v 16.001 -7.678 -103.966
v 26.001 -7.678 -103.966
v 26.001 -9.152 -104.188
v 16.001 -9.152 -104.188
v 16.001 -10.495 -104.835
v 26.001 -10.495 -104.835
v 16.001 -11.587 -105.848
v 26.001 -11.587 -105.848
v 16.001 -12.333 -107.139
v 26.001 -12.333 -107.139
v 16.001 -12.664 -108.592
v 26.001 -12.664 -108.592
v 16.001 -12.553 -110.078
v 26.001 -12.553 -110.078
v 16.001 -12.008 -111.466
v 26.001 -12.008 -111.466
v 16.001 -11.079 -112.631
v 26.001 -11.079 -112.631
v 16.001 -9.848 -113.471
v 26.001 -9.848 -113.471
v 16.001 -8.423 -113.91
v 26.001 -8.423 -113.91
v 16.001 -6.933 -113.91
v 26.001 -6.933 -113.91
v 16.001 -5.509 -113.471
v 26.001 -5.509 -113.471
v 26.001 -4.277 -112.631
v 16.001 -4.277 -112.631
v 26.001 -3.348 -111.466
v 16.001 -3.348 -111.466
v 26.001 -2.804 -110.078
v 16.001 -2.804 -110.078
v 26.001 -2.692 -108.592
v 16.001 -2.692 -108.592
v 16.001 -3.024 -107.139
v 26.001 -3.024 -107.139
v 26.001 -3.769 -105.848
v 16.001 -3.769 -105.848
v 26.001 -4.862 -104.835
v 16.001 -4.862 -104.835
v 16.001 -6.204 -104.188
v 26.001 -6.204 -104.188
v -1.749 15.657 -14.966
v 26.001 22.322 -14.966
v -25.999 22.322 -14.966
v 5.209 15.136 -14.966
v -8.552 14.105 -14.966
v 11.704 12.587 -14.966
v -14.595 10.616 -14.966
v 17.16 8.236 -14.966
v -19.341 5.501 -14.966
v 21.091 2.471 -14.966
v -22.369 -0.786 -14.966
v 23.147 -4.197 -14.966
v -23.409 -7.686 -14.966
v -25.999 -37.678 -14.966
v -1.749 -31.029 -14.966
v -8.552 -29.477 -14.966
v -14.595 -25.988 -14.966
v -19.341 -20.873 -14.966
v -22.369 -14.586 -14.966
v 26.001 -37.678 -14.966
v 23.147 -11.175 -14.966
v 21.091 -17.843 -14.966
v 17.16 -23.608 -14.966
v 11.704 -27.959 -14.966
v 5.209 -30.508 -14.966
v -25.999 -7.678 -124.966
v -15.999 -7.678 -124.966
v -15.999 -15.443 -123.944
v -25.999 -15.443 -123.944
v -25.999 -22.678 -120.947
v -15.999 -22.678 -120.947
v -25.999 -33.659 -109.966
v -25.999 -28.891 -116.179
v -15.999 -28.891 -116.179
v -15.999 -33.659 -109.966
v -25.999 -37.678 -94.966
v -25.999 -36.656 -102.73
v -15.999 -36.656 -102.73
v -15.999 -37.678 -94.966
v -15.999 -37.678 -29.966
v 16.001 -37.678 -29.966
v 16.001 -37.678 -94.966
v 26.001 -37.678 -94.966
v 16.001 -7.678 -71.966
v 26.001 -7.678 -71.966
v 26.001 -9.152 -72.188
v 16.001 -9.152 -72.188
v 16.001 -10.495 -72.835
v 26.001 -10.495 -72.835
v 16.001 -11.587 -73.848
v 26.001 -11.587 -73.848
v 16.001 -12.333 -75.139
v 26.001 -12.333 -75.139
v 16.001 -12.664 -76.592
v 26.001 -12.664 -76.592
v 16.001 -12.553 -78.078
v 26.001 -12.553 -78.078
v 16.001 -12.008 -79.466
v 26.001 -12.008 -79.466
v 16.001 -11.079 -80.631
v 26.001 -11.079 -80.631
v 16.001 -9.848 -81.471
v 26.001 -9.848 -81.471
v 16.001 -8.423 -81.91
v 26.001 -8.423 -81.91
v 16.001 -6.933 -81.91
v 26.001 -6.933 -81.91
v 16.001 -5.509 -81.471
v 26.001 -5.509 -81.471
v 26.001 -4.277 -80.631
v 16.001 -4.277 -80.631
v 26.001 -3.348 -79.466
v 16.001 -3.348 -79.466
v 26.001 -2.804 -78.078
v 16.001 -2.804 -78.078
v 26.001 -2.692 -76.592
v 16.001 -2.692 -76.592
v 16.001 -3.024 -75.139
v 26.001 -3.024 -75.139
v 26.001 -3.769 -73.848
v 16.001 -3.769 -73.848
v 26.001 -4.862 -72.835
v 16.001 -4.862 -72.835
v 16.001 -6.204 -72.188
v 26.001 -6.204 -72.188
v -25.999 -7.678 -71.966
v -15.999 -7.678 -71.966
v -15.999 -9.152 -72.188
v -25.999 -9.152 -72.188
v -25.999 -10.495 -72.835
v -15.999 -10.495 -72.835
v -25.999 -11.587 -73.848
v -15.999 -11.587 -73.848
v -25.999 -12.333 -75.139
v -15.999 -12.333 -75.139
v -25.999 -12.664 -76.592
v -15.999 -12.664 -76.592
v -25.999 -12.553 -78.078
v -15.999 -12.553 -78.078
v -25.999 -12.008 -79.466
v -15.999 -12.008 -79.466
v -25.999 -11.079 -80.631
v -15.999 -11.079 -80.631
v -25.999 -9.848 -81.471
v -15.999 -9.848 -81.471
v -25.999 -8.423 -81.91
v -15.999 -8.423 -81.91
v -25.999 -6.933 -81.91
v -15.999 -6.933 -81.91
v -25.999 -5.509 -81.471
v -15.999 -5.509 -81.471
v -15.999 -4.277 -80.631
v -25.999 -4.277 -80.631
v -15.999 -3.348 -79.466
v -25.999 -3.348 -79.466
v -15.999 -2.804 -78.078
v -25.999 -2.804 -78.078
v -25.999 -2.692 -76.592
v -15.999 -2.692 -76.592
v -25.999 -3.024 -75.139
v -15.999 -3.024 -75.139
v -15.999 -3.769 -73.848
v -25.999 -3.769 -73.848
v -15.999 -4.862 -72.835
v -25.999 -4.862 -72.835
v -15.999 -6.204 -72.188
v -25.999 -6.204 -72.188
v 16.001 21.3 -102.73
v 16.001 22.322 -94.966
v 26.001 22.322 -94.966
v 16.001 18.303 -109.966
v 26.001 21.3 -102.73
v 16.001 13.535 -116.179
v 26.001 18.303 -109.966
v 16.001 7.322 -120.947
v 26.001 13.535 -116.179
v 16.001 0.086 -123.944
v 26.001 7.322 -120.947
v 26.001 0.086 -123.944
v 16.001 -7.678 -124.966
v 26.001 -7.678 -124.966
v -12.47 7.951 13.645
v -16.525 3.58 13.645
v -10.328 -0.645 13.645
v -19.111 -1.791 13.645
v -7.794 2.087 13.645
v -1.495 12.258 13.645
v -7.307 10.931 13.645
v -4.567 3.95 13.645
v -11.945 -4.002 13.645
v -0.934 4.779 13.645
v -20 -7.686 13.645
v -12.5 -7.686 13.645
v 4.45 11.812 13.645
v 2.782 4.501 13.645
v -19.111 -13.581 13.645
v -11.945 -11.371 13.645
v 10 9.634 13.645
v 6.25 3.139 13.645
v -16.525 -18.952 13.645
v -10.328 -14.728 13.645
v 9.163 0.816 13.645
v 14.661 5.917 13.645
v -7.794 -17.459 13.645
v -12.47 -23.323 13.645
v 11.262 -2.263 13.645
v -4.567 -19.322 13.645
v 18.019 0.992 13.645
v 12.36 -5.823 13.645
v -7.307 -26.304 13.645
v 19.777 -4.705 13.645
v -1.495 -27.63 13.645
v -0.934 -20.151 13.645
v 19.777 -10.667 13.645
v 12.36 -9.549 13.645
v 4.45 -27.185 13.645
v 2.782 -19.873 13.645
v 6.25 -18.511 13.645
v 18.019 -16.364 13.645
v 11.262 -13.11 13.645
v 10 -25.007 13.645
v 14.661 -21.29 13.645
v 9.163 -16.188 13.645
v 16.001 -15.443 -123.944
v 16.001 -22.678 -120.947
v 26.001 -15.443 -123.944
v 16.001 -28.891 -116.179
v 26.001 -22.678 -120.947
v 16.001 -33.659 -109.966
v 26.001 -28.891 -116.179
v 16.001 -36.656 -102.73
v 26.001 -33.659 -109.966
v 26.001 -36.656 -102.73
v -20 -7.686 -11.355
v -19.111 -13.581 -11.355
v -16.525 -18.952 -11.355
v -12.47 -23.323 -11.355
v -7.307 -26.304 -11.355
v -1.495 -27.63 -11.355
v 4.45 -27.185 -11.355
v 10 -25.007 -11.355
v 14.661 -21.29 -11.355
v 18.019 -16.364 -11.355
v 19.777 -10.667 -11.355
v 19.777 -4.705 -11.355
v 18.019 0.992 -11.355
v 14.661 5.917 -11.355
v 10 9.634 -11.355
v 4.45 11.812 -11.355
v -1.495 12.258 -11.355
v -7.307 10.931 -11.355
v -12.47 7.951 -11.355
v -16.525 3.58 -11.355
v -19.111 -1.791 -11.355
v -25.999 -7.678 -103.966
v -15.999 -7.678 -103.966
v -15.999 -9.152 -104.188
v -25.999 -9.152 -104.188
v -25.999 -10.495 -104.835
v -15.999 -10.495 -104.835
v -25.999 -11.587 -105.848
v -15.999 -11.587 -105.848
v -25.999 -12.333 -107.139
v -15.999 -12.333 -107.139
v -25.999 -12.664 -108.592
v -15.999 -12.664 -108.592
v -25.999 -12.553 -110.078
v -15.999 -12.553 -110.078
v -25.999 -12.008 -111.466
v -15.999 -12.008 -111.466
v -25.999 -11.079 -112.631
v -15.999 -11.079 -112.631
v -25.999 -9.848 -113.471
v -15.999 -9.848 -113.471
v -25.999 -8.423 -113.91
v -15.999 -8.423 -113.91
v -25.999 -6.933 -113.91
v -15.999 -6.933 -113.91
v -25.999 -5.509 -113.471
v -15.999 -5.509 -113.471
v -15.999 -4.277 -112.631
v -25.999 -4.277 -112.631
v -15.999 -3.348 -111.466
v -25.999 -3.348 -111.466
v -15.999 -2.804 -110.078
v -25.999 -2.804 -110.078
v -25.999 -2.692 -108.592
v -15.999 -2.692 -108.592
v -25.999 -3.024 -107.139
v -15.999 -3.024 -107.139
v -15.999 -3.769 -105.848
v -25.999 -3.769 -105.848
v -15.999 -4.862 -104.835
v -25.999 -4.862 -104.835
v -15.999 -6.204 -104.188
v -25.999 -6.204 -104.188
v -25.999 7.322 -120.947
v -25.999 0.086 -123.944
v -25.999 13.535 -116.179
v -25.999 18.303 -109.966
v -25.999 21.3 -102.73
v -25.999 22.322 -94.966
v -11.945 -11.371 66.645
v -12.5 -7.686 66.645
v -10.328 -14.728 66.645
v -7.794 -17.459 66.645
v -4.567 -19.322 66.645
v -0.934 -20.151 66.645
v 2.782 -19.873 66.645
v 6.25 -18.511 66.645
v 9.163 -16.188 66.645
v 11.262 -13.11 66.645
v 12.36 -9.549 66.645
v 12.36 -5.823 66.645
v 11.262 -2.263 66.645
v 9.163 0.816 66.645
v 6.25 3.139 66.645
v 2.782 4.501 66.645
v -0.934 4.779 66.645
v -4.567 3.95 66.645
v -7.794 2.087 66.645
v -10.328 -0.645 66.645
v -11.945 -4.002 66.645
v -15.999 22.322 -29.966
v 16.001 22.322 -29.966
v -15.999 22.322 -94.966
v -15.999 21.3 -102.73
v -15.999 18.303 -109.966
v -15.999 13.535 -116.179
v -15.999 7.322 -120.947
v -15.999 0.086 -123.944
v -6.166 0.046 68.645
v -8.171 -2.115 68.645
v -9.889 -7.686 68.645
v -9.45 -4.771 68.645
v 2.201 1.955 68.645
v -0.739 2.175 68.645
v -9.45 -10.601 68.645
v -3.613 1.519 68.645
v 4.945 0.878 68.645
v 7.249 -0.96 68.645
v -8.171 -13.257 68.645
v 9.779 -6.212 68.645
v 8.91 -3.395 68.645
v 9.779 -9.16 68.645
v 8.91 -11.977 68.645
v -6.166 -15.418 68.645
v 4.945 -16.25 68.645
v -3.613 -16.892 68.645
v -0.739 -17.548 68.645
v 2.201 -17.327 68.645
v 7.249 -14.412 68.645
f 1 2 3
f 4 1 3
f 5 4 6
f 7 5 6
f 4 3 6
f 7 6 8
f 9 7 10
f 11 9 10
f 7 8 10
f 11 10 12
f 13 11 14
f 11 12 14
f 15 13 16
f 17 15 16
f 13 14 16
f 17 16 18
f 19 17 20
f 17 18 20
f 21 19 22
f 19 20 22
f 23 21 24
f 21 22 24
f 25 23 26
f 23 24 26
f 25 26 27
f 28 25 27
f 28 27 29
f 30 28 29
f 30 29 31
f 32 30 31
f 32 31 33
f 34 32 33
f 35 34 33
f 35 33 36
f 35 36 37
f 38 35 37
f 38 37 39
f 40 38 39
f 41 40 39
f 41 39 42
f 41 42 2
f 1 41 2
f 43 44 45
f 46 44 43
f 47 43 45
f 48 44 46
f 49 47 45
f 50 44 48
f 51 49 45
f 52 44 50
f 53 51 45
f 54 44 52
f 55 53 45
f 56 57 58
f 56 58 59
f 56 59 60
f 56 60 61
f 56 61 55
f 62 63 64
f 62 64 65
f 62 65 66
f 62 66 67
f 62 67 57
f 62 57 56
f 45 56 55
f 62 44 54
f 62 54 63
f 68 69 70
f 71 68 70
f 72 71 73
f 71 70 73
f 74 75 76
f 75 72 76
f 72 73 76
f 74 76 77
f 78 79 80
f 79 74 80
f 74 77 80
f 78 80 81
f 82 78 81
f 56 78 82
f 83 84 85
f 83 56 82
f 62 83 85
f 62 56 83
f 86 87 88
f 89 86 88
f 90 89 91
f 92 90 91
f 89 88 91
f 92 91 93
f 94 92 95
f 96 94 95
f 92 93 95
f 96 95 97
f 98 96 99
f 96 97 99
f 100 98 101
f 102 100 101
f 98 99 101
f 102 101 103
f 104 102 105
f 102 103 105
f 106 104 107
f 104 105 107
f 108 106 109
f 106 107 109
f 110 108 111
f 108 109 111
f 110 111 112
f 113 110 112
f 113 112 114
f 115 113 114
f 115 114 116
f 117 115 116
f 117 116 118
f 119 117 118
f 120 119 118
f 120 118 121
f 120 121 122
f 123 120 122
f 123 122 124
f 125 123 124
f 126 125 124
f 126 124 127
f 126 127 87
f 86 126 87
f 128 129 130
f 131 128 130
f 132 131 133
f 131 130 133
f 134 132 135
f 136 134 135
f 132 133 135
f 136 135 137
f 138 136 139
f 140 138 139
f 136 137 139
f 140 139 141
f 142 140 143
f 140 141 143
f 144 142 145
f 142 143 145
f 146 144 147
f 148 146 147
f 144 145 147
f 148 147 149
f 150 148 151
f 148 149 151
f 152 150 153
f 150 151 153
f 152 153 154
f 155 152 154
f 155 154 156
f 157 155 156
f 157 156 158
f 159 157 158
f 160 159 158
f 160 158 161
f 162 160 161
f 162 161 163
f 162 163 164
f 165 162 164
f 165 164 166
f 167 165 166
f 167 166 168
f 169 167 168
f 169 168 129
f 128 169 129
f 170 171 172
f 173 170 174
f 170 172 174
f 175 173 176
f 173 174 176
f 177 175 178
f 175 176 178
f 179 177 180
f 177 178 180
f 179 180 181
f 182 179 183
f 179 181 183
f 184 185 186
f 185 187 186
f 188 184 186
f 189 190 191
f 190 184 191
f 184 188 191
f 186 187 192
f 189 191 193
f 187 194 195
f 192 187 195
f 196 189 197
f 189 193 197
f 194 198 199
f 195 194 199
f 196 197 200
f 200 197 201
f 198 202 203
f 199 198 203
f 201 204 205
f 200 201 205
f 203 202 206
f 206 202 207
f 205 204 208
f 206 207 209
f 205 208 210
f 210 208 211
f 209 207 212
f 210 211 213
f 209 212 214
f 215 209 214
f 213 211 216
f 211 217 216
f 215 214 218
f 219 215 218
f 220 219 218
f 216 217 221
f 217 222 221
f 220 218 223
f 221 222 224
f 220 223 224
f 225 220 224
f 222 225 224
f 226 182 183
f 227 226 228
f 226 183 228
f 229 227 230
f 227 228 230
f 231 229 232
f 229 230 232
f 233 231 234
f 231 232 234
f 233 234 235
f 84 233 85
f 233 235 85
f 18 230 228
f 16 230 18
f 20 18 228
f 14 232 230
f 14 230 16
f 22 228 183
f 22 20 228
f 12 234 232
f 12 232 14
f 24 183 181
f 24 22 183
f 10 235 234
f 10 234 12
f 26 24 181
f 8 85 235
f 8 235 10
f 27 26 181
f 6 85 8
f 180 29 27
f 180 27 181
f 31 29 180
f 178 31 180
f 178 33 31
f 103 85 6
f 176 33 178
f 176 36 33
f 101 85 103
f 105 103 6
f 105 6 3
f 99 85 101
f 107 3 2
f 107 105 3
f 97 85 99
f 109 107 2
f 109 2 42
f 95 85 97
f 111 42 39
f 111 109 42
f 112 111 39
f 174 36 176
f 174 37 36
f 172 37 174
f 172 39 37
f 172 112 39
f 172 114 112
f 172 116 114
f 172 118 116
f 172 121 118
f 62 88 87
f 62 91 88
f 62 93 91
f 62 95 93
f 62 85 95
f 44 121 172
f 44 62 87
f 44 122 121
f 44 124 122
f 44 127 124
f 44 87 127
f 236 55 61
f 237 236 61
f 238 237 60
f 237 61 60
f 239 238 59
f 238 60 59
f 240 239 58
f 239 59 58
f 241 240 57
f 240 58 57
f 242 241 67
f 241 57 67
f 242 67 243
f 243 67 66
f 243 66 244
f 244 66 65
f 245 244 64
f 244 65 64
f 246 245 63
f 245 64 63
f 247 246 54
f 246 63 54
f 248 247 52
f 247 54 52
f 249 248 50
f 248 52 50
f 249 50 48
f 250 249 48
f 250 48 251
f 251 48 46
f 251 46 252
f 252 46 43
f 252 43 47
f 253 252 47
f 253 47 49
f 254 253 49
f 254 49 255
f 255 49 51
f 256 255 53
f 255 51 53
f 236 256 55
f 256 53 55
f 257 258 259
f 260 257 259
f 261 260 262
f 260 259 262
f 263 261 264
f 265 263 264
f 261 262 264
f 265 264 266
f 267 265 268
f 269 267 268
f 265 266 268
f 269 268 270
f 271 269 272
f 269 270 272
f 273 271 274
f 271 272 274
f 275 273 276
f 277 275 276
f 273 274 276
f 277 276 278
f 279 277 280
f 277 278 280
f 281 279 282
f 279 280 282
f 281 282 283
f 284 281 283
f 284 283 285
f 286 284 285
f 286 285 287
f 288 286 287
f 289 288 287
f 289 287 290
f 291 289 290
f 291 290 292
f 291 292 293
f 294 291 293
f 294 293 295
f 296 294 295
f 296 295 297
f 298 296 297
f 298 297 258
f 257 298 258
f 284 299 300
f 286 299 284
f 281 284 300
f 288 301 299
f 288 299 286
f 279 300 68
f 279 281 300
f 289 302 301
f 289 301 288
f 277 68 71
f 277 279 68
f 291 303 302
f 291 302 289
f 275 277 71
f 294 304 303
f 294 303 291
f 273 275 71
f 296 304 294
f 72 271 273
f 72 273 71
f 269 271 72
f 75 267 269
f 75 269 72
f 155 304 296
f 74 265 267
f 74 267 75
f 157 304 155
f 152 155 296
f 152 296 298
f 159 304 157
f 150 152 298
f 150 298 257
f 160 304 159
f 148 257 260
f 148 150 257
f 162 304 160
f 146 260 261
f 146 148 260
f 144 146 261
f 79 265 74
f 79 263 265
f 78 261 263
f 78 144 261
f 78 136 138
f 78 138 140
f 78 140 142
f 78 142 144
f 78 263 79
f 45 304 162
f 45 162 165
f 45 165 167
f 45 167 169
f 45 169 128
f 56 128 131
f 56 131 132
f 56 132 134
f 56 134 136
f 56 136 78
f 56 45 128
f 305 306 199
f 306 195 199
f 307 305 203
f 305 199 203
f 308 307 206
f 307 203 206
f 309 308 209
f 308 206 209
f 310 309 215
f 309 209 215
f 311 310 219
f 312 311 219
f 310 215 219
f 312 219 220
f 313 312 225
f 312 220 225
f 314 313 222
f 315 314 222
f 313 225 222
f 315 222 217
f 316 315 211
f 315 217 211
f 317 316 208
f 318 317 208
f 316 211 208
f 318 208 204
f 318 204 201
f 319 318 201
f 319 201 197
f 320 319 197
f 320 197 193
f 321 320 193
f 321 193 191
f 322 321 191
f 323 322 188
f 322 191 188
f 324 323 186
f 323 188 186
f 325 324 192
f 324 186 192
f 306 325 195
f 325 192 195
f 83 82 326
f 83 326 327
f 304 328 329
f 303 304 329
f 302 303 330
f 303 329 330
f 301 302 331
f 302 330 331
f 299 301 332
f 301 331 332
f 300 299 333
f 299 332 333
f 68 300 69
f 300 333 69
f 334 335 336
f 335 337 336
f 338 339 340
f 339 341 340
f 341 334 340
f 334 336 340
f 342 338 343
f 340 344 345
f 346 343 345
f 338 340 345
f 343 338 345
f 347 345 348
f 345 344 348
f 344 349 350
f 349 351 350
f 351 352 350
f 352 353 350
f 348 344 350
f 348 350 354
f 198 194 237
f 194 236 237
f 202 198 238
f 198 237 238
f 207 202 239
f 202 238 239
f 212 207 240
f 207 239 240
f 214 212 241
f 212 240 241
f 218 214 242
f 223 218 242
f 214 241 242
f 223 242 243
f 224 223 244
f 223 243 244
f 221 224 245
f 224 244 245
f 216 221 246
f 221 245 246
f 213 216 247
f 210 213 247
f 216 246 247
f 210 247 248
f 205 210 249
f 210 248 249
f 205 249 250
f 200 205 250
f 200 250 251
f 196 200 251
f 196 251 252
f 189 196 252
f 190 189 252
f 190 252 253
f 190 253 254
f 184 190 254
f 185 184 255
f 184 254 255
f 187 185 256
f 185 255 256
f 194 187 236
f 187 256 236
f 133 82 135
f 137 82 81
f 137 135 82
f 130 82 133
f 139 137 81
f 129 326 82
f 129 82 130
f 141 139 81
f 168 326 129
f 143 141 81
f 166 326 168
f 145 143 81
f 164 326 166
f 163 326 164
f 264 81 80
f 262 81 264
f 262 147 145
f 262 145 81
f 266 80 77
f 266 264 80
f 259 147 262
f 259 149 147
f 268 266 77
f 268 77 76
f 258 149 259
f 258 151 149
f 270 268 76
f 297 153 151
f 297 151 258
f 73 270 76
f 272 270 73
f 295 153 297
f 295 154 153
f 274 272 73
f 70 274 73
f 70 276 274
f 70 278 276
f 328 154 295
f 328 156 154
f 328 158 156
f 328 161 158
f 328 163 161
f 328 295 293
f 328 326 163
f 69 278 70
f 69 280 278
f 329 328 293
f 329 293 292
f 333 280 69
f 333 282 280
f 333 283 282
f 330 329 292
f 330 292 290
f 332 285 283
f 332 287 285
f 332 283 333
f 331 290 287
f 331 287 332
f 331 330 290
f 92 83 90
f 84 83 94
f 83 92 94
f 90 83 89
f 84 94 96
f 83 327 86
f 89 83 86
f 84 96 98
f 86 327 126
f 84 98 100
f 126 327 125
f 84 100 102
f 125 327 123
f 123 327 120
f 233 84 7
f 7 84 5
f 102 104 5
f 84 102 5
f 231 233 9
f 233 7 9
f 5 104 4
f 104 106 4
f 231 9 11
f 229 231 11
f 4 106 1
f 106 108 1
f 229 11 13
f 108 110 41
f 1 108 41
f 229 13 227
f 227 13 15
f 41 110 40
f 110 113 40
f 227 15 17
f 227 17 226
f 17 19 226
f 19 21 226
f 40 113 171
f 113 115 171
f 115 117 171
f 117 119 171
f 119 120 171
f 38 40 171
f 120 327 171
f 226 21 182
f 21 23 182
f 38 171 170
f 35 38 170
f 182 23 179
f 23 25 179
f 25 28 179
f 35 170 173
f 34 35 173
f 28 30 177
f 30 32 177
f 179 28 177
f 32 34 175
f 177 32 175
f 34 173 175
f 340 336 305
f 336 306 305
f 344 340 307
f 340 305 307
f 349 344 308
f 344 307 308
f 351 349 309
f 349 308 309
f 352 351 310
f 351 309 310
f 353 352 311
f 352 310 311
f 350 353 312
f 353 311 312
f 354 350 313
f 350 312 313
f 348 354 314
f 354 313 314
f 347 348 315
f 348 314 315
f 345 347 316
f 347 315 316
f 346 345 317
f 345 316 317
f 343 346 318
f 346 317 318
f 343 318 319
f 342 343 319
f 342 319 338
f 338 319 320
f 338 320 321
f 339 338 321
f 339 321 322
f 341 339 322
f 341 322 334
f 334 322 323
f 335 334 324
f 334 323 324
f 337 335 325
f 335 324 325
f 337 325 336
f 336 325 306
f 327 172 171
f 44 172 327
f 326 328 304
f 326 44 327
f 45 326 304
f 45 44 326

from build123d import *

# Parameters (mm, degrees)
BOSS_EXTRUDE1_DEPTH      = 5
BOSS_EXTRUDE1_DEPTH_BACK = 105
SKETCH5_W                = 32
SKETCH5_H                = 95
CUT_EXTRUDE1_DEPTH       = 100
CUT_EXTRUDE2_DEPTH       = 40
CUT_EXTRUDE2_DEPTH_BACK  = 113
SKETCH7_R                = 5
CUT_EXTRUDE4_DEPTH       = 234
CUT_EXTRUDE4_DEPTH_BACK  = 234


with BuildPart() as part:
    # Sketch2 → Revolve2 (revolve)
    with BuildSketch(Plane(origin=(0, 0, 0), x_dir=(0, 0, -1), z_dir=(1, 0, 0))):
        Polygon((15.054954353, -7.686097714), (-68.645045647, -7.686097714), (-68.645045647, 2.203003026), (-66.645045647, 4.813902286), (-13.645045647, 4.813902286), (-13.645045647, 12.313902286), (11.354954353, 12.313902286), (15.054954353, 15.806805515), align=None)
    revolve(axis=Axis((0, -7.686097714, -15.054954353), (0, 0, 1)))

    # 3DSketch2 → Boss-Extrude1 (add, two sides: drawn at the far end of the back side and taken through both)
    with BuildSketch(Plane(origin=(26.001222768, 22.321847461, -19.965853613), x_dir=(-0.6549305384178419, -0.7556890827898176, 0), z_dir=(0, 0, 1)).offset(-BOSS_EXTRUDE1_DEPTH_BACK)):
        Polygon((0, 0), (34.056387998, -39.295832305), (79.397732965, 0), (45.341344967, 39.295832305), align=None)
    extrude(amount=BOSS_EXTRUDE1_DEPTH + BOSS_EXTRUDE1_DEPTH_BACK)

    # Sketch5 → Cut-Extrude1 (cut)
    with BuildSketch(Plane(origin=(0, 22.321847461, 0), x_dir=(1, 0, 0), z_dir=(0, 1, 0))):
        with Locations((0.001222768, 77.465853613)):
            Rectangle(SKETCH5_W, SKETCH5_H)
    extrude(amount=-CUT_EXTRUDE1_DEPTH, mode=Mode.SUBTRACT)

    # Sketch7 → Cut-Extrude2 (cut, two sides: drawn at the far end of the back side and taken through both)
    with BuildSketch(Plane(origin=(26.001222768, 0, 0), x_dir=(0, 0, -1), z_dir=(1, 0, 0)).offset(-CUT_EXTRUDE2_DEPTH_BACK)):
        with Locations((76.965853613, -7.678152539)):
            Circle(SKETCH7_R)
        with Locations((108.965853613, -7.678152539)):
            Circle(SKETCH7_R)
    extrude(amount=CUT_EXTRUDE2_DEPTH + CUT_EXTRUDE2_DEPTH_BACK, mode=Mode.SUBTRACT)

    # Sketch8 → Cut-Extrude4 (cut, two sides: drawn at the far end of the back side and taken through both)
    with BuildSketch(Plane(origin=(26.001222768, 0, 0), x_dir=(0, 0, -1), z_dir=(1, 0, 0)).offset(-CUT_EXTRUDE4_DEPTH_BACK)):
        with BuildLine():
            Line((124.965853613, -37.678152539), (124.965853613, -7.678152493))
            ThreePointArc((124.965853613, -7.678152493), (116.179057065, -28.891355958), (94.965853613, -37.678152539))
            Line((94.965853613, -37.678152539), (124.965853613, -37.678152539))
        make_face()
        with BuildLine():
            Line((124.965853613, -7.678152493), (124.965853613, 22.321847461))
            Line((124.965853613, 22.321847461), (94.965853613, 22.321847461))
            ThreePointArc((94.965853613, 22.321847461), (116.179057032, 13.535050913), (124.965853613, -7.678152493))
        make_face()
    extrude(amount=CUT_EXTRUDE4_DEPTH + CUT_EXTRUDE4_DEPTH_BACK, mode=Mode.SUBTRACT)


solid = part.part
